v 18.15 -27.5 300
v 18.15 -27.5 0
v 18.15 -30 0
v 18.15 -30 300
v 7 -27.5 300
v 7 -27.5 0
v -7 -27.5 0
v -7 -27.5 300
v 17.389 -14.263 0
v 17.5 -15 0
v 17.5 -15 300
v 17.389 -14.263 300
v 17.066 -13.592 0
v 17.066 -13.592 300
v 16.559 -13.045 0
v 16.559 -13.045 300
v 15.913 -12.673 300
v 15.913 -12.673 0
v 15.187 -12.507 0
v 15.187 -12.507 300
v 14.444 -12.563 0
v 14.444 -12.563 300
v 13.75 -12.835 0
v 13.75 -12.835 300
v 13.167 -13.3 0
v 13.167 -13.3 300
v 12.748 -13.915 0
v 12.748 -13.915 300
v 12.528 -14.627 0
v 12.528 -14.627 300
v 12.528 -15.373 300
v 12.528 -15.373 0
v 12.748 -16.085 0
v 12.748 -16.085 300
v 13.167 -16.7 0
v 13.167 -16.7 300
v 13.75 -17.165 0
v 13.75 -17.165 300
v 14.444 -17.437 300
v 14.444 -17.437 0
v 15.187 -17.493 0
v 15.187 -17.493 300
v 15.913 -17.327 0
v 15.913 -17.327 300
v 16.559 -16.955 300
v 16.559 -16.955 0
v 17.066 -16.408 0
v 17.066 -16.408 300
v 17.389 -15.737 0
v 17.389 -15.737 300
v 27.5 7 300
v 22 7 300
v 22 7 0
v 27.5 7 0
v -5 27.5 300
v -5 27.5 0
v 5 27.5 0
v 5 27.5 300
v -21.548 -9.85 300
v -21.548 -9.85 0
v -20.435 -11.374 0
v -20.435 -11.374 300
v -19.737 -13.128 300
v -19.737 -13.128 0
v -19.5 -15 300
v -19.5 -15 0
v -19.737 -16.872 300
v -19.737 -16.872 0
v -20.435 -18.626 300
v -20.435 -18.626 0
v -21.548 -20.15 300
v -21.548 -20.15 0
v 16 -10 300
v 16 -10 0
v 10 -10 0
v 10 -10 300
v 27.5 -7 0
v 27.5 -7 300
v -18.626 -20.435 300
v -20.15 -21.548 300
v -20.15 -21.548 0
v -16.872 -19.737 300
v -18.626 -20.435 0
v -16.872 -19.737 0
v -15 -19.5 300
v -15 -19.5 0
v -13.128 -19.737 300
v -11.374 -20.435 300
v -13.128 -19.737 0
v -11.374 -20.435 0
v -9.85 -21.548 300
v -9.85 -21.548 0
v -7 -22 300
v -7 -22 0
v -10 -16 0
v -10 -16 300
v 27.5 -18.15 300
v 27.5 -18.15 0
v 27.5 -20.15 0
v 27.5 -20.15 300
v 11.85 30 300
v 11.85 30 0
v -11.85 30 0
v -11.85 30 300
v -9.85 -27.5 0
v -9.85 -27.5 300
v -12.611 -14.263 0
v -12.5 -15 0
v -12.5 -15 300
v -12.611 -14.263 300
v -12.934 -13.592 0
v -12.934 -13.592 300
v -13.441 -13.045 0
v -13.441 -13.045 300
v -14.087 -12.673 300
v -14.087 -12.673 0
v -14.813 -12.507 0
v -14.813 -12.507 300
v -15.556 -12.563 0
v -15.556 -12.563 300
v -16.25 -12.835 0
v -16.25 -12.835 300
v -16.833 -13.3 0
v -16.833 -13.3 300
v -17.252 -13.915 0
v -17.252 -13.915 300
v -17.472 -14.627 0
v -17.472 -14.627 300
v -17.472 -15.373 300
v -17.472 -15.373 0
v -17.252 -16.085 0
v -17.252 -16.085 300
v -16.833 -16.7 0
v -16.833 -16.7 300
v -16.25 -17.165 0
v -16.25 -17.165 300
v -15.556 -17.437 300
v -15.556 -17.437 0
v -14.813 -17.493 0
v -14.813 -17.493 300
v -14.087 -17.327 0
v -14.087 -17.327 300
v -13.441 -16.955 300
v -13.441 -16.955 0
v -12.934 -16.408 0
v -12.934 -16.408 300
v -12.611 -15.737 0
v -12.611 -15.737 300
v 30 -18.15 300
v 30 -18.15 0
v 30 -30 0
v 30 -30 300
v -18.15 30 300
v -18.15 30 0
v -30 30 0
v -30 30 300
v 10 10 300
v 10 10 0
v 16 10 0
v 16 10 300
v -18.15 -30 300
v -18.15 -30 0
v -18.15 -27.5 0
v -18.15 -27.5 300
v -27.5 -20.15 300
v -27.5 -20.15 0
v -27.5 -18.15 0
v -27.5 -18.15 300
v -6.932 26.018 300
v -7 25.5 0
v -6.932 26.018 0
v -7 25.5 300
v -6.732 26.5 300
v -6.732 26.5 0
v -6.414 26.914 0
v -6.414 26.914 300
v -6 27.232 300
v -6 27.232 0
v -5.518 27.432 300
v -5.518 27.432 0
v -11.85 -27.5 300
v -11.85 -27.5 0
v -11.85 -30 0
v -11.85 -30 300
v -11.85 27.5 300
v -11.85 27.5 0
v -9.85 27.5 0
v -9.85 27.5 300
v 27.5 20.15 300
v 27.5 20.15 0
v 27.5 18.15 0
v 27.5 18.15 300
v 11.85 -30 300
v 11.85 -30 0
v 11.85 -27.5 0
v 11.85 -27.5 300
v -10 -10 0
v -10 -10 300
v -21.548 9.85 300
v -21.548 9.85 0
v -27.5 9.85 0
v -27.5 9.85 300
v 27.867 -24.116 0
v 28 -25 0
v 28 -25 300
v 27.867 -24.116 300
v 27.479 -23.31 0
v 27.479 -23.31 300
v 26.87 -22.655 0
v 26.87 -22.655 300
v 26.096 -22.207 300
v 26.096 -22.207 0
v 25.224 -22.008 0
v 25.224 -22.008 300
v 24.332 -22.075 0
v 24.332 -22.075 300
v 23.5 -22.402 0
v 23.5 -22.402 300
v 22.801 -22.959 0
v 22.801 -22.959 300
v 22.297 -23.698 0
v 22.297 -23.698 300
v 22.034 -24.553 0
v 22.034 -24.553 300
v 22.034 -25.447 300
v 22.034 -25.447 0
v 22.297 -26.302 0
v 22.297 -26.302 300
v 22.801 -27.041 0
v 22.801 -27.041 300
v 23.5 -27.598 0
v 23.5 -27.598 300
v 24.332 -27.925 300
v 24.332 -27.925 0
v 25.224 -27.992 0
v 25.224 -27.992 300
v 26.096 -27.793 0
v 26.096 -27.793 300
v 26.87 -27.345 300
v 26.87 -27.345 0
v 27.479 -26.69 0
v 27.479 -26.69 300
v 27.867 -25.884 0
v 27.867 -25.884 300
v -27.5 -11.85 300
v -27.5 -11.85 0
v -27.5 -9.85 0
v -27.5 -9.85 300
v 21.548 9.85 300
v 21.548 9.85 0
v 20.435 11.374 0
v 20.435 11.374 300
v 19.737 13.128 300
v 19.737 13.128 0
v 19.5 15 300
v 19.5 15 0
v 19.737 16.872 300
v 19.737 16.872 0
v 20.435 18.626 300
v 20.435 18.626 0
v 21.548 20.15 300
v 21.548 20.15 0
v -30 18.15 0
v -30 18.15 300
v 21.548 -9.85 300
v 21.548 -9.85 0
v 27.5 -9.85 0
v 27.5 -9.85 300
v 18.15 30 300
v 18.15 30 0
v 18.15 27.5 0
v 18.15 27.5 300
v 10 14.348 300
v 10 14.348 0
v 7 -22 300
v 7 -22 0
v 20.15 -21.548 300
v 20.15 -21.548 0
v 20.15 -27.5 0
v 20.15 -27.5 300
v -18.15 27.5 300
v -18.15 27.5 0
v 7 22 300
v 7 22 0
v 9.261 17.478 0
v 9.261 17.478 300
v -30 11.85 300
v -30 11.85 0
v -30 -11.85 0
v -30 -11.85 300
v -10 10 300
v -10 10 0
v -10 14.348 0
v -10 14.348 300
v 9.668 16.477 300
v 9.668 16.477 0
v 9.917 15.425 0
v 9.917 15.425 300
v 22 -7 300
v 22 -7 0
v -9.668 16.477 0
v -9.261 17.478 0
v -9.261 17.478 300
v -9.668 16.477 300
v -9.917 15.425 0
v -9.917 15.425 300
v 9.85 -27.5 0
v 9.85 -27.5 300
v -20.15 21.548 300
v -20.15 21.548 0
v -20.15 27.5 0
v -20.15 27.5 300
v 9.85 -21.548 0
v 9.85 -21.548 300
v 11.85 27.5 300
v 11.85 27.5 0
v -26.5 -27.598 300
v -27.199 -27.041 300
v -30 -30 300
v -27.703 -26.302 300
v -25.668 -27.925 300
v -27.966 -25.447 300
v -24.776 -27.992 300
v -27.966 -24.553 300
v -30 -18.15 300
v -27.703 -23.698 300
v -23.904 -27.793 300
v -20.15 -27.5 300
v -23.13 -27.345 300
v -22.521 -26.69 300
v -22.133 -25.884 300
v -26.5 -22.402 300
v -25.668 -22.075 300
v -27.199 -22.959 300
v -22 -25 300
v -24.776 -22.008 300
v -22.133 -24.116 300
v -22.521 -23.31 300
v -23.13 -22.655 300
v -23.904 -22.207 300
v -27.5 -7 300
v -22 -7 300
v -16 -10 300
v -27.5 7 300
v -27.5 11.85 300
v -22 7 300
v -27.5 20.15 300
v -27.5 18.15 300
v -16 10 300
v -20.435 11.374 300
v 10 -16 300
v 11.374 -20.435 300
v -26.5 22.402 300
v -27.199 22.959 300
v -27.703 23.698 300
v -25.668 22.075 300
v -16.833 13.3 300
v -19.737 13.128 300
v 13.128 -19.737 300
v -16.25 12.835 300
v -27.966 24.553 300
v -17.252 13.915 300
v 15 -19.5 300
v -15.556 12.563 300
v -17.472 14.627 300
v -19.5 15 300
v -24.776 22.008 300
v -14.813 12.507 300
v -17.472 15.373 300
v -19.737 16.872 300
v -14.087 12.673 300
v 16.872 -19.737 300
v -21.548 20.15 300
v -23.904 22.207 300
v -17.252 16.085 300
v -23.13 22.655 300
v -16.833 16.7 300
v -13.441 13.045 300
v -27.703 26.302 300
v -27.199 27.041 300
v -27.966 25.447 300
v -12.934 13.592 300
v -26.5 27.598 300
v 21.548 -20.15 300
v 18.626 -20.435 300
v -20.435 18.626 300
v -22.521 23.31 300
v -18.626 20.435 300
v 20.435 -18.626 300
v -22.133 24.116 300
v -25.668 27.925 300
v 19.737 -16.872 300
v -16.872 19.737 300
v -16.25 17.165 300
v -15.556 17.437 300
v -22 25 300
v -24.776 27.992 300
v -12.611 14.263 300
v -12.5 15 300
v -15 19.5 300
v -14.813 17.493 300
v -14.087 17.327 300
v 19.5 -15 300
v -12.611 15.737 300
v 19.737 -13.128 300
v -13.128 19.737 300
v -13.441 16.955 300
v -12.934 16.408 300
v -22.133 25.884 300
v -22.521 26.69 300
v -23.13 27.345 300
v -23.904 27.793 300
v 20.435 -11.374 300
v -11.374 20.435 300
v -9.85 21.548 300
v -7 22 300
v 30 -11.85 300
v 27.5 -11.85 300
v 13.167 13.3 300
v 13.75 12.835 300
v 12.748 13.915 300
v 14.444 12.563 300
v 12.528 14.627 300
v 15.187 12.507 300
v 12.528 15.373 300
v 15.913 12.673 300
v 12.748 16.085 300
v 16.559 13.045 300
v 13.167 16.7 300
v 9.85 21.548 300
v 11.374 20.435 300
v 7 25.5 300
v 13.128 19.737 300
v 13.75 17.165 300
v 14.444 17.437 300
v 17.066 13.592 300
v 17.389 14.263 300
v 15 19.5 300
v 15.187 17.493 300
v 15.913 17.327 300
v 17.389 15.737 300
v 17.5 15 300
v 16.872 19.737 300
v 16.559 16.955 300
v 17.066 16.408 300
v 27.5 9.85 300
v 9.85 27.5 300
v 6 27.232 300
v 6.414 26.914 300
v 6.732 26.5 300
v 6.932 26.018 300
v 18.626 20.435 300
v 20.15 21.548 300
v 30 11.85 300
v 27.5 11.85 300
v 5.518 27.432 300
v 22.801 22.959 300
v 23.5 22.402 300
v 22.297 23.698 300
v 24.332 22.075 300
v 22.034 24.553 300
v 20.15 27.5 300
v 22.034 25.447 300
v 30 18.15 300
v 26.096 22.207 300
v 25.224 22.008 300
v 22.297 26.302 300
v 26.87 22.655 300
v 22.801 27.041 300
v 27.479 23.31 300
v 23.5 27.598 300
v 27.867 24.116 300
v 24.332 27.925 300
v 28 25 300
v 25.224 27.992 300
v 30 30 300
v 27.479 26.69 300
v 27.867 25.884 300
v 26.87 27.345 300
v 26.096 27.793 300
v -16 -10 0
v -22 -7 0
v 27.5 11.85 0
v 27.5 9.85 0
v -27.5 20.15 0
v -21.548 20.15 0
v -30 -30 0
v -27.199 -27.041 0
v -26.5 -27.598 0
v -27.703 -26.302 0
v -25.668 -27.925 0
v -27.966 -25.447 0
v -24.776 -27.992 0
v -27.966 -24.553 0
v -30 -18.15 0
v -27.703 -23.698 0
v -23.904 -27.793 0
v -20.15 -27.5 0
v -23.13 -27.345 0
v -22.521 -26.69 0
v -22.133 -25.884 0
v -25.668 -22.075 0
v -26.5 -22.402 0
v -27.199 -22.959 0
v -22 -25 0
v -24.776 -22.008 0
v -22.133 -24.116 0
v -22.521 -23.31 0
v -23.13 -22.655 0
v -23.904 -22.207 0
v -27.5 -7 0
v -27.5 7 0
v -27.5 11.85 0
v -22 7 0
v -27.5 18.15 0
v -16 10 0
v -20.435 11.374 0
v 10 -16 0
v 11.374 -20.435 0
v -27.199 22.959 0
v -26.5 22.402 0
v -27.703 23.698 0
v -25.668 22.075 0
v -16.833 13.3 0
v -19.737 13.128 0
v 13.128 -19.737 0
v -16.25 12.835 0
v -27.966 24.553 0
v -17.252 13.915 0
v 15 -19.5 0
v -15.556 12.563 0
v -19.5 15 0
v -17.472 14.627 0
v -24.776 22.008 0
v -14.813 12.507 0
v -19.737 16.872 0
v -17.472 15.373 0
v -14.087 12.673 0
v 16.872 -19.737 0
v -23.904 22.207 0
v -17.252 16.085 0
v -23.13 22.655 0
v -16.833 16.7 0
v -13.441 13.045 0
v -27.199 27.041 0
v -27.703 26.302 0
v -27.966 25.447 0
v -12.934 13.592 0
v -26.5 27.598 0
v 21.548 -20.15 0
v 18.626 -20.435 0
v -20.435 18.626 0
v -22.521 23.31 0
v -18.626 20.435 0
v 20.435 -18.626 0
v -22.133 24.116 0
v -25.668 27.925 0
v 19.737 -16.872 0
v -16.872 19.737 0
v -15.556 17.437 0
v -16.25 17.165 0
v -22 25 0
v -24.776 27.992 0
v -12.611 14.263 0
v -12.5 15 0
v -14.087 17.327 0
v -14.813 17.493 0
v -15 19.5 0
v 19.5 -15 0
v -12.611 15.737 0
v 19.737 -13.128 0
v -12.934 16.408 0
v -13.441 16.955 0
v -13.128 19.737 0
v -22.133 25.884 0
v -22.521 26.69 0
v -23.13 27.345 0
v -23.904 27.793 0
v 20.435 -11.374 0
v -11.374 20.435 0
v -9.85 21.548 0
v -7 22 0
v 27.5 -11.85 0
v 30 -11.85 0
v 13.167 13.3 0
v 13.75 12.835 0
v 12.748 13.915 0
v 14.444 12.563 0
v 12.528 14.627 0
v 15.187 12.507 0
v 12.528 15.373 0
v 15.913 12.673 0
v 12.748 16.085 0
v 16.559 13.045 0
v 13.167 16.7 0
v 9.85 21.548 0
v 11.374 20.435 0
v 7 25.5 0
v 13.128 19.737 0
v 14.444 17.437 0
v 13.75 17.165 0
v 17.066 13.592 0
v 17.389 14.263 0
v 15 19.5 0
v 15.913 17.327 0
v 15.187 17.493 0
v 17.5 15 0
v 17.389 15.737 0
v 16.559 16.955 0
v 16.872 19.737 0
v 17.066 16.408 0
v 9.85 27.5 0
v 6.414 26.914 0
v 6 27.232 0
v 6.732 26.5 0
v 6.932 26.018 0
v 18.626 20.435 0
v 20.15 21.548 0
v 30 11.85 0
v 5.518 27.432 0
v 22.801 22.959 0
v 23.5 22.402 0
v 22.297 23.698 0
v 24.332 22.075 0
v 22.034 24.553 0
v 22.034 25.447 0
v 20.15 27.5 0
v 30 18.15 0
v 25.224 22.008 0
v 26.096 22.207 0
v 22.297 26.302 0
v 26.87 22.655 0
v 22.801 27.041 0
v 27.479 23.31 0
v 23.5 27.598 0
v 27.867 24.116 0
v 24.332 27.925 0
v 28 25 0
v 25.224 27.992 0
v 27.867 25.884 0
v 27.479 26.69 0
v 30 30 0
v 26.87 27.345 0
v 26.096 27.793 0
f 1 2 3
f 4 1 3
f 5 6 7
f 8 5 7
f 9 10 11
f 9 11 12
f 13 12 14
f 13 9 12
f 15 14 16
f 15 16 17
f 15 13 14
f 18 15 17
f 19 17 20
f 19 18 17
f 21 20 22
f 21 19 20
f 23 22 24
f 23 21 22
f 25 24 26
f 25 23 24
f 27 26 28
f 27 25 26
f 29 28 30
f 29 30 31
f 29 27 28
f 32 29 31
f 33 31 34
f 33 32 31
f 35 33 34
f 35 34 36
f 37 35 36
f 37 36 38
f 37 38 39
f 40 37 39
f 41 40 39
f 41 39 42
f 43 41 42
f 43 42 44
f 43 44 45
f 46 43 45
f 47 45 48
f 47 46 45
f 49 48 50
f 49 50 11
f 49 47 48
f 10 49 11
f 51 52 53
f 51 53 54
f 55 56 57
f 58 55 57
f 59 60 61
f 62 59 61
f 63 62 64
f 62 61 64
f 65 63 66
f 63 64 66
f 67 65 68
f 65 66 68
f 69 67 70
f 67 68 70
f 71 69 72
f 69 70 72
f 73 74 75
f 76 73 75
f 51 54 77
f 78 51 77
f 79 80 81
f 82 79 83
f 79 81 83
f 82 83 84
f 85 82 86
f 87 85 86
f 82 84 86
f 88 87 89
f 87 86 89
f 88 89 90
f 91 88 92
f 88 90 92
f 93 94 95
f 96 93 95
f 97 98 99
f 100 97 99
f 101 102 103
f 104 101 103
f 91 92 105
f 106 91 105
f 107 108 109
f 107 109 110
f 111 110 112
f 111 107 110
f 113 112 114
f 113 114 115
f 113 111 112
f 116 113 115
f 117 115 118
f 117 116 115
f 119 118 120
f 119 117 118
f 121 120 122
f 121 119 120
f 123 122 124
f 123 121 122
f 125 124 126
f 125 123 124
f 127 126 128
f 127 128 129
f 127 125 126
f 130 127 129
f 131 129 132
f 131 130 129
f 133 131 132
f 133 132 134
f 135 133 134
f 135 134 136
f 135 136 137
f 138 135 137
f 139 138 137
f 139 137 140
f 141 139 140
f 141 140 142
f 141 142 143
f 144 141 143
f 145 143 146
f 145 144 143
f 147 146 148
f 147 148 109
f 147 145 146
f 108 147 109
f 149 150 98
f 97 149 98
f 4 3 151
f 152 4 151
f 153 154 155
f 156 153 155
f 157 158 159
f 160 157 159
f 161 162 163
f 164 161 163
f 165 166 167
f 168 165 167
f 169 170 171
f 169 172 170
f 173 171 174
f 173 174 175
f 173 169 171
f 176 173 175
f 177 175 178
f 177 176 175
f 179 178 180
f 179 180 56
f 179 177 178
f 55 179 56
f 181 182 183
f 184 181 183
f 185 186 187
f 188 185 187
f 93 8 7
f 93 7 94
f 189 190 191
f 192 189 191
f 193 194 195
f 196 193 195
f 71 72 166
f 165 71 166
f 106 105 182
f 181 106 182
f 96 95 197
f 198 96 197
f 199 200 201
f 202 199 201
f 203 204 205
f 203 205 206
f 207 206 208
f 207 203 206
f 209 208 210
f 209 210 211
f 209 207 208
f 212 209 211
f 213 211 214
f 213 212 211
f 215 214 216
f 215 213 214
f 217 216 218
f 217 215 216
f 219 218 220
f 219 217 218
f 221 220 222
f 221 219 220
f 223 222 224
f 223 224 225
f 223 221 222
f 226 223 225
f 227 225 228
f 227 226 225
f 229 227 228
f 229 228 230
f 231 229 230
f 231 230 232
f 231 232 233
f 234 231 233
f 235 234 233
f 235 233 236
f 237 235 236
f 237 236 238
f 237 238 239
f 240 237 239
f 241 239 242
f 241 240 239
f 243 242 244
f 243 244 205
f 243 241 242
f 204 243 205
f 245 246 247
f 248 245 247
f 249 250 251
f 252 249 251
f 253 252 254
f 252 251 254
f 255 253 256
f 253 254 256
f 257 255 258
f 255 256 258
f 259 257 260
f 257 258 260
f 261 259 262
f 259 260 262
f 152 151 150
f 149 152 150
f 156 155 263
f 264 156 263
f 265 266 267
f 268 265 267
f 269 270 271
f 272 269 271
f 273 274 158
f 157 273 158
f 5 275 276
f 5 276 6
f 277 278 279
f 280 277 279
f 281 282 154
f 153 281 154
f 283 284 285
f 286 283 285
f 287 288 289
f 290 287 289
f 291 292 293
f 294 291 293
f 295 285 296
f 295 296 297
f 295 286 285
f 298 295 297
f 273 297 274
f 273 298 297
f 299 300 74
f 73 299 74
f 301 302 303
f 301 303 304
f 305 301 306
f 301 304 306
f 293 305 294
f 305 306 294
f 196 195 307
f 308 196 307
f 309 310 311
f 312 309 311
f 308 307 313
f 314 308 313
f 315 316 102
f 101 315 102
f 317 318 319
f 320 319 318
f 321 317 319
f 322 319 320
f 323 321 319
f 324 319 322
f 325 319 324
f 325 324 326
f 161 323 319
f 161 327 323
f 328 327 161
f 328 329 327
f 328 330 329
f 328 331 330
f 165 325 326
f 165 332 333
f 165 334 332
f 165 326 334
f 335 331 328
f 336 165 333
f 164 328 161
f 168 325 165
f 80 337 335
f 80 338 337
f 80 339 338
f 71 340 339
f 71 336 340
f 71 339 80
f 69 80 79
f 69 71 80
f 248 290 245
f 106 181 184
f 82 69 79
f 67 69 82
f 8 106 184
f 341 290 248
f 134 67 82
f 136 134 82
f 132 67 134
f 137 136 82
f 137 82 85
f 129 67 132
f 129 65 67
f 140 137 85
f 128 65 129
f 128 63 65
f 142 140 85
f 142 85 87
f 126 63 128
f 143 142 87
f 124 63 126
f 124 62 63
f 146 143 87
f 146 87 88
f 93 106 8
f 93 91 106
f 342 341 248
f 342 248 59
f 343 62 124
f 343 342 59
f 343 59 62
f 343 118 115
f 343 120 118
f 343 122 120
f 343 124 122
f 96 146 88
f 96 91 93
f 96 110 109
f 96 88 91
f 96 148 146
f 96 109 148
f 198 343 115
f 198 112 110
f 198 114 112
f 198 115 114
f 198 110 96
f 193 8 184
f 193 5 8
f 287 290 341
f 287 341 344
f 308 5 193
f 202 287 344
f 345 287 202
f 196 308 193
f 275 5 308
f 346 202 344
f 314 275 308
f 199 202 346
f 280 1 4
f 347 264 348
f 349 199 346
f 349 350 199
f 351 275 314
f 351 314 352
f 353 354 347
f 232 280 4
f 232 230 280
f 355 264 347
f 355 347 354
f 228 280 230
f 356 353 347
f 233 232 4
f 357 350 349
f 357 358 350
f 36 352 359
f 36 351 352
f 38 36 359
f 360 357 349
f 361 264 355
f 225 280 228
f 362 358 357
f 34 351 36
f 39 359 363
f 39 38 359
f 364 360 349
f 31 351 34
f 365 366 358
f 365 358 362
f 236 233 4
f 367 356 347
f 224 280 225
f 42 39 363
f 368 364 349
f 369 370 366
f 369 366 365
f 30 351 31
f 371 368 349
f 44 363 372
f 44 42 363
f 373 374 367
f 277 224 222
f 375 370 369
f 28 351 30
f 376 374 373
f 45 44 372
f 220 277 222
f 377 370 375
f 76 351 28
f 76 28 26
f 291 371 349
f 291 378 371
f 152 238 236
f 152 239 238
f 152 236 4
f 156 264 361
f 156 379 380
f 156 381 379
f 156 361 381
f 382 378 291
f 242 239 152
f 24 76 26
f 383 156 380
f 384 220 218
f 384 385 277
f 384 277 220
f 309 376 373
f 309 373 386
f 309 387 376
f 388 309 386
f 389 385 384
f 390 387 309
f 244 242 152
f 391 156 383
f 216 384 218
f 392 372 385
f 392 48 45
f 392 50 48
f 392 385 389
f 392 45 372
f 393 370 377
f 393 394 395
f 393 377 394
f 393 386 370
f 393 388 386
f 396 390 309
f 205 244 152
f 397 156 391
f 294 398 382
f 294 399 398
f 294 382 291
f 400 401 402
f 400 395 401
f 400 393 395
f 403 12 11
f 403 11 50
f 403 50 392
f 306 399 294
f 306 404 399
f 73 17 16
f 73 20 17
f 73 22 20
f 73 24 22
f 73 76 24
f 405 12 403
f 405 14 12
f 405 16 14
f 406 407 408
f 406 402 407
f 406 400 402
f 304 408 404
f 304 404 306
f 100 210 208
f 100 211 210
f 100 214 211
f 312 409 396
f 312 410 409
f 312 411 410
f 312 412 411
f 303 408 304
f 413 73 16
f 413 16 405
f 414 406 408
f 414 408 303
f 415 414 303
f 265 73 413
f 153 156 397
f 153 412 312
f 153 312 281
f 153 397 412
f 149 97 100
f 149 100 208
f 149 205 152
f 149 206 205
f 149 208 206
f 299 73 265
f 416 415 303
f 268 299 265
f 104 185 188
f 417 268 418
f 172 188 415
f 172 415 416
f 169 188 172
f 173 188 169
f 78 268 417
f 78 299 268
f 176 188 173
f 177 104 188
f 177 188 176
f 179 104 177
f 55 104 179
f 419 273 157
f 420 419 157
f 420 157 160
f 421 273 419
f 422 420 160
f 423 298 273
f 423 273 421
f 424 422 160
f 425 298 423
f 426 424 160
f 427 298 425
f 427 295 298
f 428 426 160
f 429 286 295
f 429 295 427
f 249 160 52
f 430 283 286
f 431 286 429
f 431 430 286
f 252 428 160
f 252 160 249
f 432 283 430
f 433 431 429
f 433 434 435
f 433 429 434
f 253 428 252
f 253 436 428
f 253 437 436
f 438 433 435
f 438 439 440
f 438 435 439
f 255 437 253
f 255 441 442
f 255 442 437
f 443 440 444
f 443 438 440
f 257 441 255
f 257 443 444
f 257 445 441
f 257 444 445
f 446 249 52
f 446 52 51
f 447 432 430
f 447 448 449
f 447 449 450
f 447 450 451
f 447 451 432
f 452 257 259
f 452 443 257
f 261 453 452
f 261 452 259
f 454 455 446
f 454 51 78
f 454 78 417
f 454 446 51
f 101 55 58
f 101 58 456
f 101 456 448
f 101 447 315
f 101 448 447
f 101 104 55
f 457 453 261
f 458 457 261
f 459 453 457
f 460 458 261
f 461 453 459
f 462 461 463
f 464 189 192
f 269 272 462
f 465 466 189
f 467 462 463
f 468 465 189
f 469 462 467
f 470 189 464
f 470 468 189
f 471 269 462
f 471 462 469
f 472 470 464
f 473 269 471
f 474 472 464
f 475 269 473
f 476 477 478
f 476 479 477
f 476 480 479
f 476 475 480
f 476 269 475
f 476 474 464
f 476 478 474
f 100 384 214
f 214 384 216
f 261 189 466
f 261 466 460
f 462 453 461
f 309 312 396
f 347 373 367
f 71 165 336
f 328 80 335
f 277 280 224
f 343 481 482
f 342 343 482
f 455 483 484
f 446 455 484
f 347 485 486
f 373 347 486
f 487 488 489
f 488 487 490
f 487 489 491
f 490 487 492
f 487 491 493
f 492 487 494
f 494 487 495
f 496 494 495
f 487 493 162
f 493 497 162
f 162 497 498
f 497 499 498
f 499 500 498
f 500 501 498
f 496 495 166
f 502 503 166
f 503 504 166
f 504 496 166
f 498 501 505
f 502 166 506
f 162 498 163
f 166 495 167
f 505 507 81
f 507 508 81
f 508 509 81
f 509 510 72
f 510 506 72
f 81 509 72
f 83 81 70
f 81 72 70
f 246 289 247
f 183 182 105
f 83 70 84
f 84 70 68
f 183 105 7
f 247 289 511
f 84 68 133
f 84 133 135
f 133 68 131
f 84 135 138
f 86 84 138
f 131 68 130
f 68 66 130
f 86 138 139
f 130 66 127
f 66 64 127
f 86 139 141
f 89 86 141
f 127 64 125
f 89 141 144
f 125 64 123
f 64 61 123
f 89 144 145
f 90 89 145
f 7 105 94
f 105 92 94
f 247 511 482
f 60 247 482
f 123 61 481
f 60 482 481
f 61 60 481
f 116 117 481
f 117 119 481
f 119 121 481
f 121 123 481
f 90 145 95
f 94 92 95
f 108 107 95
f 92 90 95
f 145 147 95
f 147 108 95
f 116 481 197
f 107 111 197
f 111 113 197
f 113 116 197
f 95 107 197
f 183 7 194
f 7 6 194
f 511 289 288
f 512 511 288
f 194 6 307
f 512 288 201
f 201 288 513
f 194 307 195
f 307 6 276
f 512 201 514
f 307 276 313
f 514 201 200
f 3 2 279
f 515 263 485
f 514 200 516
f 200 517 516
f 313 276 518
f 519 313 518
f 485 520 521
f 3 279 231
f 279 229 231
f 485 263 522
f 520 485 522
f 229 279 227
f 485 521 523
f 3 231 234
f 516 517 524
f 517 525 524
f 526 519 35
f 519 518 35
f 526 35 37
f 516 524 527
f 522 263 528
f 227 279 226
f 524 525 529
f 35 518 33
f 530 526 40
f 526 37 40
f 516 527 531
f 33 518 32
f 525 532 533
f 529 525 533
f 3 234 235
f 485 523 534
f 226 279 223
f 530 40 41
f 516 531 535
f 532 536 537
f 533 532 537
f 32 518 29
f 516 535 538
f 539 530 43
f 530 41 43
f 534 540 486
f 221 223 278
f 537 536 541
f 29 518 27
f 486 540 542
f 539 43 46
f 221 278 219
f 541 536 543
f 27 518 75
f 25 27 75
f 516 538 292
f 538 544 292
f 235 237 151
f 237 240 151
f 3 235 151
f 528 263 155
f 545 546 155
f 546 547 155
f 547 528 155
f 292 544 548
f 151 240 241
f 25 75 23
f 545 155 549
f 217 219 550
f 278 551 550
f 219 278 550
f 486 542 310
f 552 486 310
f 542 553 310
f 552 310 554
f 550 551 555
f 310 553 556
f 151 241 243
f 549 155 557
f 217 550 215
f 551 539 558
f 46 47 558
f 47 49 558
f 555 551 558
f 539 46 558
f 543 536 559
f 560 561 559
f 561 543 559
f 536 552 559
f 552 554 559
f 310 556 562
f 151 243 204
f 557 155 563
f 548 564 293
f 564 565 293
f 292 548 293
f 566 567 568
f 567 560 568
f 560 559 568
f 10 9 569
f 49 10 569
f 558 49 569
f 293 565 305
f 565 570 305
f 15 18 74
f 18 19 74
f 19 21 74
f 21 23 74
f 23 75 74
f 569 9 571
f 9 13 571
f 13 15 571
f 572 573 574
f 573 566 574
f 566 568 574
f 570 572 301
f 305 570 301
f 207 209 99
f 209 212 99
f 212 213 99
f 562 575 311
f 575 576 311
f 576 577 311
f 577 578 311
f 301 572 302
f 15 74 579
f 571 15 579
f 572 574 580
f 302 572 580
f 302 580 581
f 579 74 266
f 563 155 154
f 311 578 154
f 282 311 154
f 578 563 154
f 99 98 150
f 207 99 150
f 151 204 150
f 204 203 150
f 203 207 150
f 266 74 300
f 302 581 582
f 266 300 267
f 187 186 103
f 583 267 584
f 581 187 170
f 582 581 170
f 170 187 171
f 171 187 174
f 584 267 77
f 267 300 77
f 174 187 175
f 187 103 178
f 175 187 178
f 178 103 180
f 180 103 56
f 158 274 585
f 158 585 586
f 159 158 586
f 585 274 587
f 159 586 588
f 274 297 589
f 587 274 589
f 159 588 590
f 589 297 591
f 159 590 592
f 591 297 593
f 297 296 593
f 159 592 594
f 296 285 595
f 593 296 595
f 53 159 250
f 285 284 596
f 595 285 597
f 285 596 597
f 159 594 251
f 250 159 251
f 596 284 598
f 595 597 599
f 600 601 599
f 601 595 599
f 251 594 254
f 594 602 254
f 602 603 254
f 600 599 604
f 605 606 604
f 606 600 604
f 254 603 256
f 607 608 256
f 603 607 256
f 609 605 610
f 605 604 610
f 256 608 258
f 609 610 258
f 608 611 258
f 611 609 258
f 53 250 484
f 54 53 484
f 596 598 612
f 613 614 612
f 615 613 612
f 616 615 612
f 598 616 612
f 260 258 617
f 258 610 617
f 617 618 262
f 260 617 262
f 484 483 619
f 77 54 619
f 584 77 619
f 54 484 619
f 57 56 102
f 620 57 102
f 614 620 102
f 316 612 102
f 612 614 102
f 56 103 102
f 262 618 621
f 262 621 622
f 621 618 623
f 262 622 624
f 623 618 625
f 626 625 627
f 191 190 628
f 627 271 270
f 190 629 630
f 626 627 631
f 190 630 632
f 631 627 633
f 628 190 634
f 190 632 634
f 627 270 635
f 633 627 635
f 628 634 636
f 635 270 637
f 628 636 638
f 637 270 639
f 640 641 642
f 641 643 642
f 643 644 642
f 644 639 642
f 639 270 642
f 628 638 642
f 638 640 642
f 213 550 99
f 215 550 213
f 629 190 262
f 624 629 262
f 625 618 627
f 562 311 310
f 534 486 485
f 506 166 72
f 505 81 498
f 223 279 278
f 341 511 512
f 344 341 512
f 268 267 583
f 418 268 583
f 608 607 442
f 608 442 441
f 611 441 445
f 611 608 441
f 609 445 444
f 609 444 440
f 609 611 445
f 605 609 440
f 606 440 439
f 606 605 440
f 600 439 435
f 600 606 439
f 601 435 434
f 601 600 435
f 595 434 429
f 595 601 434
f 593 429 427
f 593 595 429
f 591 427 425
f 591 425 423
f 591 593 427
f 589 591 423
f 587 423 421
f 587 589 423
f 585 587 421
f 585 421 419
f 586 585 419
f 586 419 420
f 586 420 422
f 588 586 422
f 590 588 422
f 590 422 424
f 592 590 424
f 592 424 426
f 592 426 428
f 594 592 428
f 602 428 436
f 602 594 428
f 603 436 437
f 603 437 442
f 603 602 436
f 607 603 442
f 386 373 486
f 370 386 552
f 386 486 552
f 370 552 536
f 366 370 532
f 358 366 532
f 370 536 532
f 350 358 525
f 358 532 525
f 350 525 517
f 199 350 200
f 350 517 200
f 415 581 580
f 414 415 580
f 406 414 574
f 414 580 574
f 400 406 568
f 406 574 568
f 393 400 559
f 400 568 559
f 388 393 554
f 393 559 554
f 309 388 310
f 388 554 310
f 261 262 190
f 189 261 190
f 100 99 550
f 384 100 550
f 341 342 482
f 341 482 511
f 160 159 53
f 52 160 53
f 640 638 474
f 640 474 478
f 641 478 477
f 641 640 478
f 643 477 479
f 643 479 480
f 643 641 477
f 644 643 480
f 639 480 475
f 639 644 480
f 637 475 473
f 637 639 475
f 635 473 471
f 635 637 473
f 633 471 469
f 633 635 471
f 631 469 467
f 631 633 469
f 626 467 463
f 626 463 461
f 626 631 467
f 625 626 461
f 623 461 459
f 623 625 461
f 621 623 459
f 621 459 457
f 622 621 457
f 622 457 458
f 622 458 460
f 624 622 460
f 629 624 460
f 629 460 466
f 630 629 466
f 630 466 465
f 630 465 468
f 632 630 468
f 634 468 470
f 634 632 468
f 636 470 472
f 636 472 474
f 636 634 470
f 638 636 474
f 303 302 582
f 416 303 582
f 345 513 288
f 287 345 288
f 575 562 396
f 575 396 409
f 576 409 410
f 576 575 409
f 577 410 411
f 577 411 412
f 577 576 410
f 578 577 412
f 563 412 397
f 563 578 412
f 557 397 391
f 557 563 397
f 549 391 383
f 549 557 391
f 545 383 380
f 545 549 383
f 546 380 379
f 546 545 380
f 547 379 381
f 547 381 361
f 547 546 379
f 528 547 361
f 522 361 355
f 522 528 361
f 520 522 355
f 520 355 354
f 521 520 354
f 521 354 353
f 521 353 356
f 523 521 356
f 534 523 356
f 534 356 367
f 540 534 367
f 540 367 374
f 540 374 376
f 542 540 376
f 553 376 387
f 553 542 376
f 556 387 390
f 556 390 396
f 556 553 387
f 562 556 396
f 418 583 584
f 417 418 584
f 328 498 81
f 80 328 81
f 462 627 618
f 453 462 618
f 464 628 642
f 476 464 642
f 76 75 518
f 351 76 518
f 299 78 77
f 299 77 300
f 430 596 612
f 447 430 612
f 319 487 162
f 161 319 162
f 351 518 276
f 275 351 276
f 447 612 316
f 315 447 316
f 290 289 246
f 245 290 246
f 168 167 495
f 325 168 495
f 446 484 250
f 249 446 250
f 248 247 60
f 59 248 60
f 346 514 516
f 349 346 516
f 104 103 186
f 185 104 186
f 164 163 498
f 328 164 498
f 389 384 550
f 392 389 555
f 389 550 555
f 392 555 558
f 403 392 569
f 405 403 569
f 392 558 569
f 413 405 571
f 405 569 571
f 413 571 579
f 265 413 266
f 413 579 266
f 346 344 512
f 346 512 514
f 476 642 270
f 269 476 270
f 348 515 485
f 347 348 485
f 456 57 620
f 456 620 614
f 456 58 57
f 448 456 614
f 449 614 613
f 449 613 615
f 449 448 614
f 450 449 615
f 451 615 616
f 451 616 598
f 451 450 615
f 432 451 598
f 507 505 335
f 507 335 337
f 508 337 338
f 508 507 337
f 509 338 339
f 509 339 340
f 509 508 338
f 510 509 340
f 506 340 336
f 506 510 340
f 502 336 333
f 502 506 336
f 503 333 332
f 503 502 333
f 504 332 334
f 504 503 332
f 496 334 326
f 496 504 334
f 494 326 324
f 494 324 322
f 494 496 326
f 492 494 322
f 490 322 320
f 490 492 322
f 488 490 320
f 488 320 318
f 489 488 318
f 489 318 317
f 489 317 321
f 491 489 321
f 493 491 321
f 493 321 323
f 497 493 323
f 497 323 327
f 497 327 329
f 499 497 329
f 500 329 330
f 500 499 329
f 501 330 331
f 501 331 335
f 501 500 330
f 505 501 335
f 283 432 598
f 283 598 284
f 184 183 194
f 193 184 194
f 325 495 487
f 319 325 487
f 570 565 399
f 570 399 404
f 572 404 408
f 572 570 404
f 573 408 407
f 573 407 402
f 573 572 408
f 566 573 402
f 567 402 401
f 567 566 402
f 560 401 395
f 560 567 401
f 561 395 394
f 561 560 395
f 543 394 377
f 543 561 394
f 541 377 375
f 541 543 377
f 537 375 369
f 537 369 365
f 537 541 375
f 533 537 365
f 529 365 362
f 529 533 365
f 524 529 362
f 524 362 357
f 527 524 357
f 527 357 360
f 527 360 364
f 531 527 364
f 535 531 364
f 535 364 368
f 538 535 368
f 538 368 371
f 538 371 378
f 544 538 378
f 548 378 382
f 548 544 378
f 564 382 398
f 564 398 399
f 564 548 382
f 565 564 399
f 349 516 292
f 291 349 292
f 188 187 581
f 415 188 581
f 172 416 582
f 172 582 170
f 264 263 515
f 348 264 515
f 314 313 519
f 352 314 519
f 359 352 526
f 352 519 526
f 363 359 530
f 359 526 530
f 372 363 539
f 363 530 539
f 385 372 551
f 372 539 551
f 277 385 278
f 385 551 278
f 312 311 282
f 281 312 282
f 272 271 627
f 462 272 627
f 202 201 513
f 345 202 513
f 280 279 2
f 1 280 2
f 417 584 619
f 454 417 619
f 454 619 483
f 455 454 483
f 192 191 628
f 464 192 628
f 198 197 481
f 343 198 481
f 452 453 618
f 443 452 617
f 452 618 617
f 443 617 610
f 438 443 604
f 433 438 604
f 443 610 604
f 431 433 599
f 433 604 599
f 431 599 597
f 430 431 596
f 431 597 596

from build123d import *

# Parameters (mm, degrees)
F0_R     = 3
F0_R_2   = 2.5
F1_DEPTH = 300
F2_R     = 2
F3_R     = 7


# Not quite as in the source:
# - a feature names something its author has since deleted; it is built from what else it names


with BuildPart() as f1:
    # F0 (on Top) → F1 (new body)
    with BuildSketch(Plane.XY):
        with BuildLine():
            Line((18.15, -30), (30, -30))
            Line((30, -30), (30, -18.15))
            Line((30, -18.15), (27.5, -18.15))
            Line((27.5, -18.15), (27.5, -20.15))
            Line((27.5, -20.15), (21.5477069044, -20.15))
            ThreePointArc((21.5477069044, -20.15), (19.5, -15), (21.5477069044, -9.85))
            Line((21.5477069044, -9.85), (27.5, -9.85))
            Line((27.5, -9.85), (27.5, -11.85))
            Line((27.5, -11.85), (30, -11.85))
            Line((30, -11.85), (30, 11.85))
            Line((30, 11.85), (27.5, 11.85))
            Line((27.5, 11.85), (27.5, 9.85))
            Line((27.5, 9.85), (21.5477069044, 9.85))
            ThreePointArc((21.5477069044, 9.85), (19.5, 15), (21.5477069044, 20.15))
            Line((21.5477069044, 20.15), (27.5, 20.15))
            Line((27.5, 20.15), (27.5, 18.15))
            Line((27.5, 18.15), (30, 18.15))
            Line((30, 18.15), (30, 30))
            Line((30, 30), (18.15, 30))
            Line((18.15, 30), (18.15, 27.5))
            Line((18.15, 27.5), (20.15, 27.5))
            Line((20.15, 27.5), (20.15, 21.5477069044))
            ThreePointArc((20.15, 21.5477069044), (15, 19.5), (9.85, 21.5477069044))
            Line((9.85, 21.5477069044), (9.85, 27.5))
            Line((9.85, 27.5), (11.85, 27.5))
            Line((11.85, 27.5), (11.85, 30))
            Line((11.85, 30), (-11.85, 30))
            Line((-11.85, 30), (-11.85, 27.5))
            Line((-11.85, 27.5), (-9.85, 27.5))
            Line((-9.85, 27.5), (-9.85, 21.5477069044))
            ThreePointArc((-9.85, 21.5477069044), (-15, 19.5), (-20.15, 21.5477069044))
            Line((-20.15, 21.5477069044), (-20.15, 27.5))
            Line((-20.15, 27.5), (-18.15, 27.5))
            Line((-18.15, 27.5), (-18.15, 30))
            Line((-18.15, 30), (-30, 30))
            Line((-30, 30), (-30, 18.15))
            Line((-30, 18.15), (-27.5, 18.15))
            Line((-27.5, 18.15), (-27.5, 20.15))
            Line((-27.5, 20.15), (-21.5477069044, 20.15))
            ThreePointArc((-21.5477069044, 20.15), (-19.5, 15), (-21.5477069044, 9.85))
            Line((-21.5477069044, 9.85), (-27.5, 9.85))
            Line((-27.5, 9.85), (-27.5, 11.85))
            Line((-27.5, 11.85), (-30, 11.85))
            Line((-30, 11.85), (-30, -11.85))
            Line((-30, -11.85), (-27.5, -11.85))
            Line((-27.5, -11.85), (-27.5, -9.85))
            Line((-27.5, -9.85), (-21.5477069044, -9.85))
            ThreePointArc((-21.5477069044, -9.85), (-19.5, -15), (-21.5477069044, -20.15))
            Line((-21.5477069044, -20.15), (-27.5, -20.15))
            Line((-27.5, -20.15), (-27.5, -18.15))
            Line((-27.5, -18.15), (-30, -18.15))
            Line((-30, -18.15), (-30, -30))
            Line((-30, -30), (-18.15, -30))
            Line((-18.15, -30), (-18.15, -27.5))
            Line((-18.15, -27.5), (-20.15, -27.5))
            Line((-20.15, -27.5), (-20.15, -21.5477069044))
            ThreePointArc((-20.15, -21.5477069044), (-15, -19.5), (-9.85, -21.5477069044))
            Line((-9.85, -21.5477069044), (-9.85, -27.5))
            Line((-9.85, -27.5), (-11.85, -27.5))
            Line((-11.85, -27.5), (-11.85, -30))
            Line((-11.85, -30), (11.85, -30))
            Line((11.85, -30), (11.85, -27.5))
            Line((11.85, -27.5), (9.85, -27.5))
            Line((9.85, -27.5), (9.85, -21.5477069044))
            ThreePointArc((9.85, -21.5477069044), (15, -19.5), (20.15, -21.5477069044))
            Line((20.15, -21.5477069044), (20.15, -27.5))
            Line((20.15, -27.5), (18.15, -27.5))
            Line((18.15, -27.5), (18.15, -30))
        make_face()
        with Locations((-25, -25)):
            Circle(F0_R, mode=Mode.SUBTRACT)
        with Locations((-15, -15)):
            Circle(F0_R_2, mode=Mode.SUBTRACT)
        with Locations((25, -25)):
            Circle(F0_R, mode=Mode.SUBTRACT)
        with Locations((15, -15)):
            Circle(F0_R_2, mode=Mode.SUBTRACT)
        with Locations((-25, 25)):
            Circle(F0_R, mode=Mode.SUBTRACT)
        with Locations((-15, 15)):
            Circle(F0_R_2, mode=Mode.SUBTRACT)
        Polygon((-7, 22), (-7, 27.5), (0, 27.5), (7, 27.5), (7, 22), (10, 16), (10, 10), (16, 10), (22, 7), (27.5, 7), (27.5, 0), (27.5, -7), (22, -7), (16, -10), (10, -10), (10, -16), (7, -22), (7, -27.5), (0, -27.5), (-7, -27.5), (-7, -22), (-10, -16), (-10, -10), (-16, -10), (-22, -7), (-27.5, -7), (-27.5, 0), (-27.5, 7), (-22, 7), (-16, 10), (-10, 10), (-10, 16), align=None, mode=Mode.SUBTRACT)
        with Locations((15, 15)):
            Circle(F0_R_2, mode=Mode.SUBTRACT)
        with Locations((25, 25)):
            Circle(F0_R, mode=Mode.SUBTRACT)
    extrude(amount=F1_DEPTH)

    # F2
    f2_edges = [f1.edges().sort_by_distance(p)[0] for p in [
        (-7, 27.5, 150),
        (7, 27.5, 150),
    ]]
    fillet(f2_edges, radius=F2_R)

    # F3
    f3_edges = [f1.edges().sort_by_distance(p)[0] for p in [
        (-10, 16, 150),
        (10, 16, 150),
    ]]
    fillet(f3_edges, radius=F3_R)


solid = f1.part
